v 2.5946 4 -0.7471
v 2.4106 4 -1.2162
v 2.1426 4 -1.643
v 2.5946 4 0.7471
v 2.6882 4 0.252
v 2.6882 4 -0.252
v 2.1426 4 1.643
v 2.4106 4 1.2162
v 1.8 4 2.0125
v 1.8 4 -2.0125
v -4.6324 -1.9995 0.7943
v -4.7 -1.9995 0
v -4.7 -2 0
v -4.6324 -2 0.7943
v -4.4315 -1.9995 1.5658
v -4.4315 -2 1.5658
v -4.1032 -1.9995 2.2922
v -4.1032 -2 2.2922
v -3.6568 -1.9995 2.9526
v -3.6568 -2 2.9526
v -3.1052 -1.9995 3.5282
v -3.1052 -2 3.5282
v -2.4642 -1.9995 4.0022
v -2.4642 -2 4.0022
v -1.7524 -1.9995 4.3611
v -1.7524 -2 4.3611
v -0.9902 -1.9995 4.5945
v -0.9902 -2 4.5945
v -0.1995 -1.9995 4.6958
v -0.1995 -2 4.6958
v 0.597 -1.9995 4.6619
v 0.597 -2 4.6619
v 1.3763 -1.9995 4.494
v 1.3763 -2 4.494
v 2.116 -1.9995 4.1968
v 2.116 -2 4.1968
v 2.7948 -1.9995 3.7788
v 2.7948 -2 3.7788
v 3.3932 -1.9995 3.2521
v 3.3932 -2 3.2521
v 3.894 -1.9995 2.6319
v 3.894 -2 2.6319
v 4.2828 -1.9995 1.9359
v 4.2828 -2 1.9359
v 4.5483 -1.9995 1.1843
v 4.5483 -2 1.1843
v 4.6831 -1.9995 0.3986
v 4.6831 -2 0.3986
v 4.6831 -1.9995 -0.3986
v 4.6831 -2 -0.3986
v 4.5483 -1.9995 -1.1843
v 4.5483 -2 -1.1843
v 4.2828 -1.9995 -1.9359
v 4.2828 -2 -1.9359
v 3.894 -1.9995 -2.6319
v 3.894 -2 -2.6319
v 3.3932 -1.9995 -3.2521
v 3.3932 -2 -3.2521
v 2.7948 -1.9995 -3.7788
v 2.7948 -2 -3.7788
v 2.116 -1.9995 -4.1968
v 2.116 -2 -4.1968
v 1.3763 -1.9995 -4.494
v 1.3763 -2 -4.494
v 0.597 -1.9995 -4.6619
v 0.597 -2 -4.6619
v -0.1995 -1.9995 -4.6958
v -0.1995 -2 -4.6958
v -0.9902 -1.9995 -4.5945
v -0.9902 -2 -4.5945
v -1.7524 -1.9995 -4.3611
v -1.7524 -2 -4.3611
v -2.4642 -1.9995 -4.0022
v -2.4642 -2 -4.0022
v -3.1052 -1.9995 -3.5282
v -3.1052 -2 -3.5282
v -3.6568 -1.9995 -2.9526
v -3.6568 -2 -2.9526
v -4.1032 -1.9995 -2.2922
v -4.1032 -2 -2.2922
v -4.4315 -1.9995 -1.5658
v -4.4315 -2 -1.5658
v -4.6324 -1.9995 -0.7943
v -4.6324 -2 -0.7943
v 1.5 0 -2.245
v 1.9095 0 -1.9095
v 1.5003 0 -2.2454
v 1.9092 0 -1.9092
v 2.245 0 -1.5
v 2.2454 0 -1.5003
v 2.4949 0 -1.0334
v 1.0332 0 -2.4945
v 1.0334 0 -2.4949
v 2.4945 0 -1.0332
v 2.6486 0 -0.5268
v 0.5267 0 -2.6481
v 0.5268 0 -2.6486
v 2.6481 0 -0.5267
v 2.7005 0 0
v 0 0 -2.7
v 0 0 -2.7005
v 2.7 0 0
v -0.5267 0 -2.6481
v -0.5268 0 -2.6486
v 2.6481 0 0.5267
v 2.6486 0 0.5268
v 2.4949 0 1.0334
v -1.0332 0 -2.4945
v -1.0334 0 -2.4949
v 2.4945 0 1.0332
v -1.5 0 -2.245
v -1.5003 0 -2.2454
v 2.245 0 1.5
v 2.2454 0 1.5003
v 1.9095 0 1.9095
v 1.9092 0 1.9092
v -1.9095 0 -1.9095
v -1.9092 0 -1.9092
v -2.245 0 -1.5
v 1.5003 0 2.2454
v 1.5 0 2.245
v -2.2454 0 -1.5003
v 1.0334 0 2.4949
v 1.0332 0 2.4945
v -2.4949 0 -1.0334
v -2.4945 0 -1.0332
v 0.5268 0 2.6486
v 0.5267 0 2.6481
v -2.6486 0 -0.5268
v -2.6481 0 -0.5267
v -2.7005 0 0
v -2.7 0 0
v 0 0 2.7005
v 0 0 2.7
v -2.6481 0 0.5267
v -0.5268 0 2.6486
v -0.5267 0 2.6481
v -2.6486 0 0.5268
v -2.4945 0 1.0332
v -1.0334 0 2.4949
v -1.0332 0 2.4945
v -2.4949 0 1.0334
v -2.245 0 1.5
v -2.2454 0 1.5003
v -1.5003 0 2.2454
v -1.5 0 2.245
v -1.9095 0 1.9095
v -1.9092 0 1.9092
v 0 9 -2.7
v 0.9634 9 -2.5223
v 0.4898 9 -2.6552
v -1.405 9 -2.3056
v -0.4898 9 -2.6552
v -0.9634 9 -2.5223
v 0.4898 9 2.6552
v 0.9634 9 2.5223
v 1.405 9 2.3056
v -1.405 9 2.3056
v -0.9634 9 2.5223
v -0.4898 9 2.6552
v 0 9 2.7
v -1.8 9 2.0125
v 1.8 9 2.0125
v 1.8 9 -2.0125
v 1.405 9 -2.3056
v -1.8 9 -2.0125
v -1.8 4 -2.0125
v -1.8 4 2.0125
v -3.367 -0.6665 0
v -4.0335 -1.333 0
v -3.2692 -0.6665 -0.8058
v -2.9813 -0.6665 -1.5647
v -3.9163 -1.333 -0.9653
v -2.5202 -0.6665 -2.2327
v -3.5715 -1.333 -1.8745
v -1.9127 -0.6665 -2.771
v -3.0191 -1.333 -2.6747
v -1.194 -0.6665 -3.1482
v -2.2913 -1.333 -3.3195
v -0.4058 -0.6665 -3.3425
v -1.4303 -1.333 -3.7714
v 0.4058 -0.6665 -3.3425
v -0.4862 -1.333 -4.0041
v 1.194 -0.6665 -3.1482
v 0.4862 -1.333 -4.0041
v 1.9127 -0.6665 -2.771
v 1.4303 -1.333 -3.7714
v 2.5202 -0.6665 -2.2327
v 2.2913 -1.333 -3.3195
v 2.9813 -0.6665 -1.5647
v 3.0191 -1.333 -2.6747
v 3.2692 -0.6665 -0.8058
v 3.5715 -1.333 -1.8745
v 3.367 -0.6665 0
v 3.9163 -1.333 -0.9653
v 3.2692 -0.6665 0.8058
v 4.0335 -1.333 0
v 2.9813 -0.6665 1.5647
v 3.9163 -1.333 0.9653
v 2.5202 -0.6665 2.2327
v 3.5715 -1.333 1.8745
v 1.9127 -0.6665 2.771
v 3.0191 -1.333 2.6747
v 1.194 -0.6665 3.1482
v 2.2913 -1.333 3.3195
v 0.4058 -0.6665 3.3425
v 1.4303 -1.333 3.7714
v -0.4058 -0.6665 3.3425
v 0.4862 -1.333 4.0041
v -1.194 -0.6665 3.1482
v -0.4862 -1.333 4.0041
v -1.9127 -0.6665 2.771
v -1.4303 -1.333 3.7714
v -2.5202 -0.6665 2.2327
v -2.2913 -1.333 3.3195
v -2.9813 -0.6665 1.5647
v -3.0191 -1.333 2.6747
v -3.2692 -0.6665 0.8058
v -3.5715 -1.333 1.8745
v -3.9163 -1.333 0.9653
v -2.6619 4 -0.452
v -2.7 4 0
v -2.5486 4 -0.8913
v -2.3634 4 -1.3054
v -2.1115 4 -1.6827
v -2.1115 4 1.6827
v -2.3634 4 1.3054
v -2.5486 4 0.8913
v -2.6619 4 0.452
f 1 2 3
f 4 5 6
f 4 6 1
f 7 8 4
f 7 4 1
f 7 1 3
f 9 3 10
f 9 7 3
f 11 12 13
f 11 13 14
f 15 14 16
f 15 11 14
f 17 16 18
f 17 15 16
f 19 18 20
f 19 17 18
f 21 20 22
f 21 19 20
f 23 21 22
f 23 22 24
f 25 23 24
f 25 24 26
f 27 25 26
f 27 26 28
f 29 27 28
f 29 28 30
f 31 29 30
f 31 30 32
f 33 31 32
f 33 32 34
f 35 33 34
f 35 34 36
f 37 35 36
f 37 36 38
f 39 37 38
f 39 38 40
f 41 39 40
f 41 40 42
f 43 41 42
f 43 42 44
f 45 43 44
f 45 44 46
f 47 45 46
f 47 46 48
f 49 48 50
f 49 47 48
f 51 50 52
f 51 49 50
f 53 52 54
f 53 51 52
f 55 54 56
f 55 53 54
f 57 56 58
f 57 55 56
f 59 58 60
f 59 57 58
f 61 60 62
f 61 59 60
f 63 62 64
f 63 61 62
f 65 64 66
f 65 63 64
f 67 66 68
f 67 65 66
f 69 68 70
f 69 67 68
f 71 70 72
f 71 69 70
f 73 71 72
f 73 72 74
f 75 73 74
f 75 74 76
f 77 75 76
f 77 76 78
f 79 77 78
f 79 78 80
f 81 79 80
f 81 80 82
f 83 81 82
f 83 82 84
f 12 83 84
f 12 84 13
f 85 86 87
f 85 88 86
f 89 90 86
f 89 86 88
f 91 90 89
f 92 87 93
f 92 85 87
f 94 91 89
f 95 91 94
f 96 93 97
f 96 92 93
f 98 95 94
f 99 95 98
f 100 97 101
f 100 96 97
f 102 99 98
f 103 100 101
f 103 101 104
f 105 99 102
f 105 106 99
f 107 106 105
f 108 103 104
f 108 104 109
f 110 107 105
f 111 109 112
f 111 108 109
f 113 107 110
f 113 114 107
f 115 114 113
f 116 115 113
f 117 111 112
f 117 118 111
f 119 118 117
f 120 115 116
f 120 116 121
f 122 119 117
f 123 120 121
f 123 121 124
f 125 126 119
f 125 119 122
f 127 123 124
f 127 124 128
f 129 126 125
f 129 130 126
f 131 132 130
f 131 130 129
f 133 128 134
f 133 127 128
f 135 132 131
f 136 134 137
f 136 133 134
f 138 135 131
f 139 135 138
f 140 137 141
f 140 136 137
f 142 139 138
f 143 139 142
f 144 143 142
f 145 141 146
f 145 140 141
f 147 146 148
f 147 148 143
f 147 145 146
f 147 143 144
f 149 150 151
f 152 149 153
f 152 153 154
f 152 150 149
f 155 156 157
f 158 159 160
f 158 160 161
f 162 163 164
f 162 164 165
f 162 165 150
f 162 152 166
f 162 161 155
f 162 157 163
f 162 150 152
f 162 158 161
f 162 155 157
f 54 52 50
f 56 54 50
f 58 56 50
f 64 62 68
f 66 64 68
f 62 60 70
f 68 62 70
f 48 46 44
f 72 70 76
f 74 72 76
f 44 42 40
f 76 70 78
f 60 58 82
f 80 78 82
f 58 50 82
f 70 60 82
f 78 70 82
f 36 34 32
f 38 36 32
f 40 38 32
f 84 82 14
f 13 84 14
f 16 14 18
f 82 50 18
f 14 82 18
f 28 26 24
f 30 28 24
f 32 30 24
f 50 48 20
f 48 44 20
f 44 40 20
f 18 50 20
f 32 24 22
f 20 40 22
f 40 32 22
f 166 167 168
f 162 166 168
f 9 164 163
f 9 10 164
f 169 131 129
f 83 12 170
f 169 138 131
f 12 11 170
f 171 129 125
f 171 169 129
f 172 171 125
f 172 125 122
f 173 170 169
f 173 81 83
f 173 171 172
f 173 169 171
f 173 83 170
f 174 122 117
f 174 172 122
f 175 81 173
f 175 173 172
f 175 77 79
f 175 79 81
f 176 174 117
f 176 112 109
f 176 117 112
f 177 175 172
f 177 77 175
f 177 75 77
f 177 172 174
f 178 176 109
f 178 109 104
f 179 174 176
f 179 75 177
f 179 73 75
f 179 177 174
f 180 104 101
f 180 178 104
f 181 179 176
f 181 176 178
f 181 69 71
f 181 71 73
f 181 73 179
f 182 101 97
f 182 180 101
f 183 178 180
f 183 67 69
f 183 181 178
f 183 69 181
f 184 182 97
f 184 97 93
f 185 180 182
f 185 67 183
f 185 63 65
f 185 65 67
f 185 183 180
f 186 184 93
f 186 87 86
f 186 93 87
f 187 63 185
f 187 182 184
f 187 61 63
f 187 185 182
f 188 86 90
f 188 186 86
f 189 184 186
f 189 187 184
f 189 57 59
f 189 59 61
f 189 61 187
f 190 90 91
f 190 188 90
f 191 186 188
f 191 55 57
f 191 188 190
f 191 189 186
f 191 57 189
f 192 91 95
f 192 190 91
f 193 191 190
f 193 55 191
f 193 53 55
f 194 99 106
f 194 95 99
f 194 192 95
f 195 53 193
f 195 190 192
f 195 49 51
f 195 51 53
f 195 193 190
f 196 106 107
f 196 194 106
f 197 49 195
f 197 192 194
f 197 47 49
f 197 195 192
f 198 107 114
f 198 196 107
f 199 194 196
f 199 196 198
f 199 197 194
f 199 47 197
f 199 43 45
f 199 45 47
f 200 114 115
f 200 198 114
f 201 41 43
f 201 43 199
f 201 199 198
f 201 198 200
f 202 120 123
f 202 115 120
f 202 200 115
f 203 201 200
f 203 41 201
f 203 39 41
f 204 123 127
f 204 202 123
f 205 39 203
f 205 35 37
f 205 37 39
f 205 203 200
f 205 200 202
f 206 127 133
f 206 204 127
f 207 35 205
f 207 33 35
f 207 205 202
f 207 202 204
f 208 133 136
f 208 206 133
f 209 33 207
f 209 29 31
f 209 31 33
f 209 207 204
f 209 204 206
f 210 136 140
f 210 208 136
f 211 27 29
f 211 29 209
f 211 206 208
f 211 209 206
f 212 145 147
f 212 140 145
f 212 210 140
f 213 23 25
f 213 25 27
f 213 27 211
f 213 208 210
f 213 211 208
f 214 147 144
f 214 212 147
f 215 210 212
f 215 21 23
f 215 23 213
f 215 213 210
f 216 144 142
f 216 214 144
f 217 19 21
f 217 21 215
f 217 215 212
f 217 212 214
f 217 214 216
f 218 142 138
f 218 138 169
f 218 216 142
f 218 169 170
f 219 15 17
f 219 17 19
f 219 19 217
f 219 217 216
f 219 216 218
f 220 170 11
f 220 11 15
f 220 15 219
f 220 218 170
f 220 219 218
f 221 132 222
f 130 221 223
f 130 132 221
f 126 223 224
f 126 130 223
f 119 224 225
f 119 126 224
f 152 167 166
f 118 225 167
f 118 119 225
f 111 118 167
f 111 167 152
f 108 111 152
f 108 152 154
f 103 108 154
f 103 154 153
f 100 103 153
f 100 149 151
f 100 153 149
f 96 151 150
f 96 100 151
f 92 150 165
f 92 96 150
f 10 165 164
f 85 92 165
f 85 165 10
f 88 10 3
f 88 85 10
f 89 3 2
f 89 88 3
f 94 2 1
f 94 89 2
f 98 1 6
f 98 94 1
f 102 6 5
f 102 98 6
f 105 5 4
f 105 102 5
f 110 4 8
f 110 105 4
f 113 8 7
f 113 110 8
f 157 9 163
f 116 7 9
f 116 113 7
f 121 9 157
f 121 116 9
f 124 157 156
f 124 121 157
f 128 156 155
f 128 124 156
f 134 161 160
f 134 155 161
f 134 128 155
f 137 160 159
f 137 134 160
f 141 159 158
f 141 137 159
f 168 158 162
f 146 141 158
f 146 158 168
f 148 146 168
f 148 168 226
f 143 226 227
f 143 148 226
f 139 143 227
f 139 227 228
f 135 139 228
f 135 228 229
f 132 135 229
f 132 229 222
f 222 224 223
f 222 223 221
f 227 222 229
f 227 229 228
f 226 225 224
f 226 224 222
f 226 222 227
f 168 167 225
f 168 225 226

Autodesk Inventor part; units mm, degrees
ref_plane "YZ Plane" through (0, 0, 0) normal (1, 0, 0) x (0, 1, 0)
ref_plane "XZ Plane" through (0, 0, 0) normal (0, 1, 0) x (-1, 0, 0)
ref_plane "XY Plane" through (0, 0, 0) normal (0, 0, 1) x (1, 0, 0)
sketch "Sketch1" plane through (0, 0, 0) normal (0, 1, 0) x (-1, 0, 0)
  line L0 (0, 0) -> (1.8, 0)
  line L1 (0, 0) -> (-1.8, 0)
  circle A0 centre (0, 0) radius 2.7
  line L2 (1.8, 0) -> (1.8, 2.0125)
  line L3 (1.8, 0) -> (1.8, -2.0125)
  line L4 (-1.8, 0) -> (-1.8, -2.0125)
  line L5 (-1.8, 0) -> (-1.8, 2.0125)
  circle A1 centre (0, 0) radius 4.7
  dimension "d0" = 1.8
  dimension "d1" = 1.8
  dimension "d2" = 5.4
  dimension "d7" = 9.4
extrude "Extrusion1" add sketch "Sketch1" along normal blind 4 contours L1 L5 A0 L2 L0 | L0 L3 A0 L4 L1 | L2 A0 L3 | L4 A0 L5
extrude "Extrusion2" add sketch "Sketch1" along normal blind 5 from surface at 4 contours L1 L5 A0 L2 L0 | L0 L3 A0 L4 L1
extrude "Extrusion3" add sketch "Sketch1" against normal blind 2 contours L1 L5 A0 L2 L0 | L0 L3 A0 L4 L1 | L2 A0 L3 | L4 A0 L5 | A1
chamfer "Chamfer1" distance 2 angle 45 1 edges at (4.7, 0, 0)
properties part number "driven gear axle"
